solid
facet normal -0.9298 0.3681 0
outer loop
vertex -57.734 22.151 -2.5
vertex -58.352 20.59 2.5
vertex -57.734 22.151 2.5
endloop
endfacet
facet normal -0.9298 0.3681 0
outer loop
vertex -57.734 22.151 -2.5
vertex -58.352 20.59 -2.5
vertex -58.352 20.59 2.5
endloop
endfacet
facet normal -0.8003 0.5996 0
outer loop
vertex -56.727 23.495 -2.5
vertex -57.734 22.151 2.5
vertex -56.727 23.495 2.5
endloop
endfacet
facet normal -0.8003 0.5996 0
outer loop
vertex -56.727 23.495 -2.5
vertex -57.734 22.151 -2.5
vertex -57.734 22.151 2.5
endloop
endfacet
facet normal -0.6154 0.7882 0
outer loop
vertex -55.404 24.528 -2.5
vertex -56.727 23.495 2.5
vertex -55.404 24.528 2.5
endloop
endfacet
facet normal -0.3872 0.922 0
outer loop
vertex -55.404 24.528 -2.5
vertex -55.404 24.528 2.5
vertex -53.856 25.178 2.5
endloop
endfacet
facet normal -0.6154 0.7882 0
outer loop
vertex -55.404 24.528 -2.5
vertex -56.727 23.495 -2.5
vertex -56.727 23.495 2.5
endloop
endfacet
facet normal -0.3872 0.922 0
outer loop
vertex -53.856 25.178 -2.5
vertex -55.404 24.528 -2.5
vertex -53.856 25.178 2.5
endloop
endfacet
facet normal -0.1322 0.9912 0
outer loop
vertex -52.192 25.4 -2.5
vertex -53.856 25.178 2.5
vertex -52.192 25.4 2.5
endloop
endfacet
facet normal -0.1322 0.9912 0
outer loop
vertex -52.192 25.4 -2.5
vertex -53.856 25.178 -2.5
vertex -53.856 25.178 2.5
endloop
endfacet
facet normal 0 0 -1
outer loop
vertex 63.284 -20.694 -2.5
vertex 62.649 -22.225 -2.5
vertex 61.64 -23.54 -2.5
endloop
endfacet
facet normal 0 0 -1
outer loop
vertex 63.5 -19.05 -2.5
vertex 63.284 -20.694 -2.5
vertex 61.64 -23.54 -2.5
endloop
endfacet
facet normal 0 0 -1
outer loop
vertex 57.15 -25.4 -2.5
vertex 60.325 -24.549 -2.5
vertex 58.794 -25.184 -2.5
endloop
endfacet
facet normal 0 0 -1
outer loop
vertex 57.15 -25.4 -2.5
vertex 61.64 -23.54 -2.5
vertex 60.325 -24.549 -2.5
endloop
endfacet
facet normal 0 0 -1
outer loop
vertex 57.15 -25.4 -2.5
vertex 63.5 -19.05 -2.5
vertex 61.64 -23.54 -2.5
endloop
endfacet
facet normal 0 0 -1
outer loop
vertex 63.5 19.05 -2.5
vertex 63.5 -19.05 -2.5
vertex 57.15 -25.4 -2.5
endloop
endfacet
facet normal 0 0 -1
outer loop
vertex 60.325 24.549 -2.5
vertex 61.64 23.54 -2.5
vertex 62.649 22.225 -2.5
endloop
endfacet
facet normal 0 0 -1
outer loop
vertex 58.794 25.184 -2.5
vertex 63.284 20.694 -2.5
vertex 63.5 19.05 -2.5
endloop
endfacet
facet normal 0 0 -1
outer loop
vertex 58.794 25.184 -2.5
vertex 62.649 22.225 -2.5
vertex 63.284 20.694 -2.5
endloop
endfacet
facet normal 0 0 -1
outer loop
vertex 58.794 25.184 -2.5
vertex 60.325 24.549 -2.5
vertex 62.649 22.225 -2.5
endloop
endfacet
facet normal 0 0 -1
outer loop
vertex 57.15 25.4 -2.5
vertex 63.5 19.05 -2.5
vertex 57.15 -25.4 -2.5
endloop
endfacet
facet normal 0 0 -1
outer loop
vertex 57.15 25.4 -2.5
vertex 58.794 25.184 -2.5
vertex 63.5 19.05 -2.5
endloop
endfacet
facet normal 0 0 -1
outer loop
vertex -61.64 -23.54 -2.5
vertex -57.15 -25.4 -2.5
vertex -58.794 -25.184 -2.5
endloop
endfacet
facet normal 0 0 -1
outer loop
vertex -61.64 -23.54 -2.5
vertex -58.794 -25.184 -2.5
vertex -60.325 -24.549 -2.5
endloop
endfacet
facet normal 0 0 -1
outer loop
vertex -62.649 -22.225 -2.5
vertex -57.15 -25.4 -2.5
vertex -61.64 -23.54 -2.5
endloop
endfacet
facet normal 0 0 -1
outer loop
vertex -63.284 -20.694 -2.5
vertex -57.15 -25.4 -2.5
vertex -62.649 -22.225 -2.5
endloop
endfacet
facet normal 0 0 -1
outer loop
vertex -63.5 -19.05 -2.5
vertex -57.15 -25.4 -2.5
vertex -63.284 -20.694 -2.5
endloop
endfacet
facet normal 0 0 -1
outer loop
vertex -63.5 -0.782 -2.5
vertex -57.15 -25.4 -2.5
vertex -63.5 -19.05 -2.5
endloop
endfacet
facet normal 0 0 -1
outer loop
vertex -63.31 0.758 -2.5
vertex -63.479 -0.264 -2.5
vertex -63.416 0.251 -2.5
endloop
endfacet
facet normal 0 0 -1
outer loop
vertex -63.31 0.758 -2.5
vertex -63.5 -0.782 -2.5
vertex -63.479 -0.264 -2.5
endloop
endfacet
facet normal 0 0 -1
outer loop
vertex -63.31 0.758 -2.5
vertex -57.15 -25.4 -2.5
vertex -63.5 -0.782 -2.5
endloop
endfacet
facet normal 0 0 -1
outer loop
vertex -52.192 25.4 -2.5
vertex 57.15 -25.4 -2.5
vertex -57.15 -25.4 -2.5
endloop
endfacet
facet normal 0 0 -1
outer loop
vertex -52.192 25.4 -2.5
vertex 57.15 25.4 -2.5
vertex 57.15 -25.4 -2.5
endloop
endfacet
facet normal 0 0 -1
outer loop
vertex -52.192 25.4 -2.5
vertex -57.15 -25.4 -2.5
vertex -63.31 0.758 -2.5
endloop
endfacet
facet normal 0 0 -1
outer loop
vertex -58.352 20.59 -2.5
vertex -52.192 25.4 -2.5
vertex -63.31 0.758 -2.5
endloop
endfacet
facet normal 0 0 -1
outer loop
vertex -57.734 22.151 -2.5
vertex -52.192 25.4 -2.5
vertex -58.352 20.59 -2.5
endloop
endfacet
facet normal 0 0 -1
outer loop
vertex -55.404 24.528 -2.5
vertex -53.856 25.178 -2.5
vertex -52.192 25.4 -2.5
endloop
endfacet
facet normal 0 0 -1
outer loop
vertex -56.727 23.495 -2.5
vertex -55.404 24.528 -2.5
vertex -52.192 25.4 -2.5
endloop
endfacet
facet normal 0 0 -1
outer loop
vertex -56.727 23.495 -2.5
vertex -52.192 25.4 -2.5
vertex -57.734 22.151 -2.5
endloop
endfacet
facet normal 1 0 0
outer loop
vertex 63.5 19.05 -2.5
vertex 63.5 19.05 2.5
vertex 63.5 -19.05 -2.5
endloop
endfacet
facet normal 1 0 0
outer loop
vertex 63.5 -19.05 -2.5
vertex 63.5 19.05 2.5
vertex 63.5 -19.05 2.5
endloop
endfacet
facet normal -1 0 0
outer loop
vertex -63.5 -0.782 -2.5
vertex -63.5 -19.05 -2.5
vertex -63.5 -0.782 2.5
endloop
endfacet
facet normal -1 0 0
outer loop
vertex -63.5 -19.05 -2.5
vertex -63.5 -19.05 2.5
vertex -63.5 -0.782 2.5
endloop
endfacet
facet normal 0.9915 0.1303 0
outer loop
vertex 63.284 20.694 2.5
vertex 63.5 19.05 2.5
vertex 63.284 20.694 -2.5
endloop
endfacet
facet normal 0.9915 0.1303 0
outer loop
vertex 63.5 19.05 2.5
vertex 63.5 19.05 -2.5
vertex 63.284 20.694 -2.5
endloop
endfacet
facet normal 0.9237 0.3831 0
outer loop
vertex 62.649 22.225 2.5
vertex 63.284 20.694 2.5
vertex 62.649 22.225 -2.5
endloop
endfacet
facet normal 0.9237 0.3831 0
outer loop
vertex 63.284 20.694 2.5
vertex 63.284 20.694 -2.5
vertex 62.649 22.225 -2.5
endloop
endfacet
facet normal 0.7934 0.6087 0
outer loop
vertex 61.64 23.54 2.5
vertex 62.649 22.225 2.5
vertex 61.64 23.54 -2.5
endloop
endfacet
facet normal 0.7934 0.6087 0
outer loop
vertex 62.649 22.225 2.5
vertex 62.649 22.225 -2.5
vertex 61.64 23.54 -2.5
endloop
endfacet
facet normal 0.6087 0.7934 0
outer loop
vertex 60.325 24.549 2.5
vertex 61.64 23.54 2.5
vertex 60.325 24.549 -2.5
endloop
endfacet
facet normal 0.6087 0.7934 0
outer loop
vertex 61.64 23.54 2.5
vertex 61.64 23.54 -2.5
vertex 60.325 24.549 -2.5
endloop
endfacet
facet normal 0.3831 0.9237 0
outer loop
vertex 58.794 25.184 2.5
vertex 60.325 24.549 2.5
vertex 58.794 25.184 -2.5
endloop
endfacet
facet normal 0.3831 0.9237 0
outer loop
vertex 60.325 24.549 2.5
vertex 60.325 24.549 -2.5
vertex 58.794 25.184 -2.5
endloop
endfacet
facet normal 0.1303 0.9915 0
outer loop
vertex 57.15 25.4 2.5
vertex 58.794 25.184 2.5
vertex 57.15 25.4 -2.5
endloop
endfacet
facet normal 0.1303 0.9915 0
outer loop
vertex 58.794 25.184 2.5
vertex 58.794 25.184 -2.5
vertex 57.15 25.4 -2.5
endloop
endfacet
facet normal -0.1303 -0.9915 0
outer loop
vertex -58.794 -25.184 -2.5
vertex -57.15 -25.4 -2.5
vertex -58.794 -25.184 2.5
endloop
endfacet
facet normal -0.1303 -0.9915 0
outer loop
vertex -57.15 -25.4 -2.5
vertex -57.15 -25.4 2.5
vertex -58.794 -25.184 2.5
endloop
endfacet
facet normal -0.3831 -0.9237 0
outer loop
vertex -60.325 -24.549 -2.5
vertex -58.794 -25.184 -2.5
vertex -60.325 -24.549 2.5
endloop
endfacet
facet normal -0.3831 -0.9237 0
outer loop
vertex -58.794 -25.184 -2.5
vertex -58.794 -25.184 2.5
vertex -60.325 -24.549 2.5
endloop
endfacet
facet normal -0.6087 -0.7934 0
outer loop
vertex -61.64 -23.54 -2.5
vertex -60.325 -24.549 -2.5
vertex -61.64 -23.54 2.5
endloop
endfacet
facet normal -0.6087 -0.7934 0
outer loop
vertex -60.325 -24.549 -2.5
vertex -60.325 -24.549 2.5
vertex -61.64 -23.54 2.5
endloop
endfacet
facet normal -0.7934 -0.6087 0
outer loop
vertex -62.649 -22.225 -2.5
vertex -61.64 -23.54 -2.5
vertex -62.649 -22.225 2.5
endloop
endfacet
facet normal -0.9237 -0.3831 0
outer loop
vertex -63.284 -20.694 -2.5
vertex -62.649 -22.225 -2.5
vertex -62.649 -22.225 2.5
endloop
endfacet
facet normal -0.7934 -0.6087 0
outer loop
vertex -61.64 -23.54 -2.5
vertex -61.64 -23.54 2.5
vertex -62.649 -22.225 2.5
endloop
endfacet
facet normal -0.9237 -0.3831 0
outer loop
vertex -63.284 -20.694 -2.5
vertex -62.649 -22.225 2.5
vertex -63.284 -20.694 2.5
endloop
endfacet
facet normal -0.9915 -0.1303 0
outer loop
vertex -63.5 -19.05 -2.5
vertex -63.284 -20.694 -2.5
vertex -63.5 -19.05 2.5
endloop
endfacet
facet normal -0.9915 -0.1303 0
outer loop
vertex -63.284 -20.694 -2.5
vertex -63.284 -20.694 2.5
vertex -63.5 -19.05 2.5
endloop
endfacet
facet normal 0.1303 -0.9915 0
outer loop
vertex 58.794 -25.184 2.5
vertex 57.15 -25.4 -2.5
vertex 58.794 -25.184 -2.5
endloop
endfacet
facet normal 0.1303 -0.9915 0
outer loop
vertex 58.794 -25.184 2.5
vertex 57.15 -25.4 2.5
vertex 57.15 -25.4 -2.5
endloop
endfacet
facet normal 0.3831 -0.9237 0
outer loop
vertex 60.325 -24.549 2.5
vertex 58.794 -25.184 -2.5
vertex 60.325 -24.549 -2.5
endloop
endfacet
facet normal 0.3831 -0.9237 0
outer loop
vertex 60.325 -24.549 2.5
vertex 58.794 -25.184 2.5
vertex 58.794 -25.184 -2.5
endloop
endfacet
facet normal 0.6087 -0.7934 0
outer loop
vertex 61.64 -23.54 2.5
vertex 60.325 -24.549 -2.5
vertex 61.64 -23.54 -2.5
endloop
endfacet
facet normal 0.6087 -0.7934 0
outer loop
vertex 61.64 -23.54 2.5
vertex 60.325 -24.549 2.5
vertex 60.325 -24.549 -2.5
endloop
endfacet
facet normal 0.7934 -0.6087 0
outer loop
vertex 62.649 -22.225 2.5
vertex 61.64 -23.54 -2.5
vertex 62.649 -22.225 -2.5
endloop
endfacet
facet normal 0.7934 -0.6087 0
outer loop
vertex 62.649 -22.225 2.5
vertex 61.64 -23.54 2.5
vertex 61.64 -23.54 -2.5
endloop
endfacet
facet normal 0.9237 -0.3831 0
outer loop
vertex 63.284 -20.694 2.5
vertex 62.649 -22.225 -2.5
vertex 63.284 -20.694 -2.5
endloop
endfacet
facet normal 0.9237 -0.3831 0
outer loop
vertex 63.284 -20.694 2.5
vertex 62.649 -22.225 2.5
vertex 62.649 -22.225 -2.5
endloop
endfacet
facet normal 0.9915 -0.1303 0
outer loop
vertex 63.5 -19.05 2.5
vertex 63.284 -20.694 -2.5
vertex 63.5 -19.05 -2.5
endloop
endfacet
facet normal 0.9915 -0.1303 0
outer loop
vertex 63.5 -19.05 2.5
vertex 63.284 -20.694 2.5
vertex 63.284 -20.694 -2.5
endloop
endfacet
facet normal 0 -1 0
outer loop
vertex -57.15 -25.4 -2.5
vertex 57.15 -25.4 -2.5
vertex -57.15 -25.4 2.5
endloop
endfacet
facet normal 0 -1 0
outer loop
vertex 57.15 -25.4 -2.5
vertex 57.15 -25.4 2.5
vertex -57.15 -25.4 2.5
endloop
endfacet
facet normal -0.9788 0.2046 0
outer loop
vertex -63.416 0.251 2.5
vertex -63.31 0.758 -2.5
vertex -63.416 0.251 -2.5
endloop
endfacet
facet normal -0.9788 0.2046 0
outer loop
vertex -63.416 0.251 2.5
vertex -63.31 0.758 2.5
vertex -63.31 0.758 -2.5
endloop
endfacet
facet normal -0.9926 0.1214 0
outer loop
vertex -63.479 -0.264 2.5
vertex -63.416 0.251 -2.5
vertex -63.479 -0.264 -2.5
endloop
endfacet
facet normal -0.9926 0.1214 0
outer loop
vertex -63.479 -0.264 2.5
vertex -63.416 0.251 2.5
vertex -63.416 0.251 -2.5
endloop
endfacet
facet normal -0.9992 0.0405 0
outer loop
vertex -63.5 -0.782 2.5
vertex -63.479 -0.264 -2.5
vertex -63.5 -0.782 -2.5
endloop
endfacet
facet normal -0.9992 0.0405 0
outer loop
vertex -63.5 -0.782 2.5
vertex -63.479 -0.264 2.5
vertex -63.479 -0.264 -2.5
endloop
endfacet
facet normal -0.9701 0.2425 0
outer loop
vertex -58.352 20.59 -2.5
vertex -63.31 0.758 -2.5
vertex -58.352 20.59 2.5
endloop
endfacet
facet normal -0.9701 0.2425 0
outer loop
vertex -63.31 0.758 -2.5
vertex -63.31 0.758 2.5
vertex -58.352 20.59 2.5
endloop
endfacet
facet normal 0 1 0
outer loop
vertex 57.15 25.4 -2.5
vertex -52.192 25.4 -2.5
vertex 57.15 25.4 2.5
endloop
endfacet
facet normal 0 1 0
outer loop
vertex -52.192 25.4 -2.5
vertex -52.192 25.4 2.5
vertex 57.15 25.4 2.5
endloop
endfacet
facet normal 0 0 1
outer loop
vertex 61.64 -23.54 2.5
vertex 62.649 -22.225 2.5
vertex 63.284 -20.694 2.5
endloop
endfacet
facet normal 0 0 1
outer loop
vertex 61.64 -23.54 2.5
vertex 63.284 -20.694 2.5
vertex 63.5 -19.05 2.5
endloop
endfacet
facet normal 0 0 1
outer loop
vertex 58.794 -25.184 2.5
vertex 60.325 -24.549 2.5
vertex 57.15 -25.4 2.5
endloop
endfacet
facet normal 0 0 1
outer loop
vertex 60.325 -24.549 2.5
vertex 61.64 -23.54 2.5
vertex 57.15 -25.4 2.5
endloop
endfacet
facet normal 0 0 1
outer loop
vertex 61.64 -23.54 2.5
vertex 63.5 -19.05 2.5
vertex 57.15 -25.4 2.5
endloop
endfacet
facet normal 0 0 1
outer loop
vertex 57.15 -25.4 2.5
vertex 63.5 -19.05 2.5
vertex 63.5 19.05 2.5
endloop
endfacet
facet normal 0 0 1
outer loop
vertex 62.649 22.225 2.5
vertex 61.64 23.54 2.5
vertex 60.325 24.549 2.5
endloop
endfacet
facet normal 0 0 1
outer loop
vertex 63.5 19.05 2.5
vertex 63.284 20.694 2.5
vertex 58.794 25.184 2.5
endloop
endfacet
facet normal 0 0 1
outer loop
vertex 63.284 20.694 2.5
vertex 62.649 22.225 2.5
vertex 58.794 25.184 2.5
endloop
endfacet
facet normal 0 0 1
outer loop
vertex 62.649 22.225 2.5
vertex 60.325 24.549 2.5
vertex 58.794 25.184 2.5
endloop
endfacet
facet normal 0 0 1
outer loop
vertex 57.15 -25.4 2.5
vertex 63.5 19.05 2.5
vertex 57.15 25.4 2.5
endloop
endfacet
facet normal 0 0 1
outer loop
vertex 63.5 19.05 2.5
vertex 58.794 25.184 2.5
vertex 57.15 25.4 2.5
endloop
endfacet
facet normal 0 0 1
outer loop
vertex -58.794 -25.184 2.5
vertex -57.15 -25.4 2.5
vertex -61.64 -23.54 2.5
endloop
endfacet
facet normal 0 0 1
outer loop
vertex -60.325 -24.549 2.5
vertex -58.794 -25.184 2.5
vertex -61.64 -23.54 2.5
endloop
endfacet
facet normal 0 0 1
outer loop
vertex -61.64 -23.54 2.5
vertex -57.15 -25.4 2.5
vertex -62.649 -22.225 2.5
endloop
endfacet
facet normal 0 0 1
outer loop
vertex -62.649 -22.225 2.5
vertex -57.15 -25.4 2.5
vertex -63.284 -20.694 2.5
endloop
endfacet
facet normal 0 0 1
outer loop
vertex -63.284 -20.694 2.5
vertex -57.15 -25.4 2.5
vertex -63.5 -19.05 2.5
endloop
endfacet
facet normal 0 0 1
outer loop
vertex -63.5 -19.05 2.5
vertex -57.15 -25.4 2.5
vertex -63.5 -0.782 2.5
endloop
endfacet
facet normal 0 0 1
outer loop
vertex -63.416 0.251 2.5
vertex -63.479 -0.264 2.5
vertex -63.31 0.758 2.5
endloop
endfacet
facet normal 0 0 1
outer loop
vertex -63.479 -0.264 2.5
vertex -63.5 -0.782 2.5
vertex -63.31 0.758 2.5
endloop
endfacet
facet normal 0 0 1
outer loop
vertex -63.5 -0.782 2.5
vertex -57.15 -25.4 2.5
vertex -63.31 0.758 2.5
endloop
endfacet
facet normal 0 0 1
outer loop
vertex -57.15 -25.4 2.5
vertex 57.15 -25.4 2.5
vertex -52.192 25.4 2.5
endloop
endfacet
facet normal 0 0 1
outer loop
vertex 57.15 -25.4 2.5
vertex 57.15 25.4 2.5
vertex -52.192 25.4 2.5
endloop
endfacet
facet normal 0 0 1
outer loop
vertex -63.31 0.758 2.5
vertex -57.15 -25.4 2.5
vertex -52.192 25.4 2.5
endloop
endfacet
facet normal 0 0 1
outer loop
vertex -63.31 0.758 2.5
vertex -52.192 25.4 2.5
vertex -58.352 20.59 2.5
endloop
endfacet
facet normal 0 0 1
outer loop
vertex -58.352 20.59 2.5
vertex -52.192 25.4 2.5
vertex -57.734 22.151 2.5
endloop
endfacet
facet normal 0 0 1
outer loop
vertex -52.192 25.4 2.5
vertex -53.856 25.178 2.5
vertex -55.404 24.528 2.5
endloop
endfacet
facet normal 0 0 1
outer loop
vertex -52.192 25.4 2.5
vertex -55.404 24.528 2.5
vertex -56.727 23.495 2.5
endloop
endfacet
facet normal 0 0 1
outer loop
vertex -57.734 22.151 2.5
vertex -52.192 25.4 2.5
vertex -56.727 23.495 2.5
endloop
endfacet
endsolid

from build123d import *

# Parameters (mm, degrees)
BOSS_EXTRUDE1_DEPTH = 2.5
FILLET1_R           = 6.35


with BuildPart() as part:
    # Sketch1 → Boss-Extrude1 (new, symmetric)
    with BuildSketch(Plane.XY):
        Polygon((-63.5, 0), (-57.15, 25.4), (63.5, 25.4), (63.5, -25.4), (-63.5, -25.4), align=None)
    extrude(amount=BOSS_EXTRUDE1_DEPTH, both=True)

    # Fillet1
    fillet1_edges = [part.edges().sort_by_distance(p)[0] for p in [
        (63.5, -25.4, 0),
        (-63.5, -25.4, 0),
        (-63.5, 0, 0),
        (-57.15, 25.4, 0),
        (63.5, 25.4, 0),
    ]]
    fillet(fillet1_edges, radius=FILLET1_R)


solid = part.part
